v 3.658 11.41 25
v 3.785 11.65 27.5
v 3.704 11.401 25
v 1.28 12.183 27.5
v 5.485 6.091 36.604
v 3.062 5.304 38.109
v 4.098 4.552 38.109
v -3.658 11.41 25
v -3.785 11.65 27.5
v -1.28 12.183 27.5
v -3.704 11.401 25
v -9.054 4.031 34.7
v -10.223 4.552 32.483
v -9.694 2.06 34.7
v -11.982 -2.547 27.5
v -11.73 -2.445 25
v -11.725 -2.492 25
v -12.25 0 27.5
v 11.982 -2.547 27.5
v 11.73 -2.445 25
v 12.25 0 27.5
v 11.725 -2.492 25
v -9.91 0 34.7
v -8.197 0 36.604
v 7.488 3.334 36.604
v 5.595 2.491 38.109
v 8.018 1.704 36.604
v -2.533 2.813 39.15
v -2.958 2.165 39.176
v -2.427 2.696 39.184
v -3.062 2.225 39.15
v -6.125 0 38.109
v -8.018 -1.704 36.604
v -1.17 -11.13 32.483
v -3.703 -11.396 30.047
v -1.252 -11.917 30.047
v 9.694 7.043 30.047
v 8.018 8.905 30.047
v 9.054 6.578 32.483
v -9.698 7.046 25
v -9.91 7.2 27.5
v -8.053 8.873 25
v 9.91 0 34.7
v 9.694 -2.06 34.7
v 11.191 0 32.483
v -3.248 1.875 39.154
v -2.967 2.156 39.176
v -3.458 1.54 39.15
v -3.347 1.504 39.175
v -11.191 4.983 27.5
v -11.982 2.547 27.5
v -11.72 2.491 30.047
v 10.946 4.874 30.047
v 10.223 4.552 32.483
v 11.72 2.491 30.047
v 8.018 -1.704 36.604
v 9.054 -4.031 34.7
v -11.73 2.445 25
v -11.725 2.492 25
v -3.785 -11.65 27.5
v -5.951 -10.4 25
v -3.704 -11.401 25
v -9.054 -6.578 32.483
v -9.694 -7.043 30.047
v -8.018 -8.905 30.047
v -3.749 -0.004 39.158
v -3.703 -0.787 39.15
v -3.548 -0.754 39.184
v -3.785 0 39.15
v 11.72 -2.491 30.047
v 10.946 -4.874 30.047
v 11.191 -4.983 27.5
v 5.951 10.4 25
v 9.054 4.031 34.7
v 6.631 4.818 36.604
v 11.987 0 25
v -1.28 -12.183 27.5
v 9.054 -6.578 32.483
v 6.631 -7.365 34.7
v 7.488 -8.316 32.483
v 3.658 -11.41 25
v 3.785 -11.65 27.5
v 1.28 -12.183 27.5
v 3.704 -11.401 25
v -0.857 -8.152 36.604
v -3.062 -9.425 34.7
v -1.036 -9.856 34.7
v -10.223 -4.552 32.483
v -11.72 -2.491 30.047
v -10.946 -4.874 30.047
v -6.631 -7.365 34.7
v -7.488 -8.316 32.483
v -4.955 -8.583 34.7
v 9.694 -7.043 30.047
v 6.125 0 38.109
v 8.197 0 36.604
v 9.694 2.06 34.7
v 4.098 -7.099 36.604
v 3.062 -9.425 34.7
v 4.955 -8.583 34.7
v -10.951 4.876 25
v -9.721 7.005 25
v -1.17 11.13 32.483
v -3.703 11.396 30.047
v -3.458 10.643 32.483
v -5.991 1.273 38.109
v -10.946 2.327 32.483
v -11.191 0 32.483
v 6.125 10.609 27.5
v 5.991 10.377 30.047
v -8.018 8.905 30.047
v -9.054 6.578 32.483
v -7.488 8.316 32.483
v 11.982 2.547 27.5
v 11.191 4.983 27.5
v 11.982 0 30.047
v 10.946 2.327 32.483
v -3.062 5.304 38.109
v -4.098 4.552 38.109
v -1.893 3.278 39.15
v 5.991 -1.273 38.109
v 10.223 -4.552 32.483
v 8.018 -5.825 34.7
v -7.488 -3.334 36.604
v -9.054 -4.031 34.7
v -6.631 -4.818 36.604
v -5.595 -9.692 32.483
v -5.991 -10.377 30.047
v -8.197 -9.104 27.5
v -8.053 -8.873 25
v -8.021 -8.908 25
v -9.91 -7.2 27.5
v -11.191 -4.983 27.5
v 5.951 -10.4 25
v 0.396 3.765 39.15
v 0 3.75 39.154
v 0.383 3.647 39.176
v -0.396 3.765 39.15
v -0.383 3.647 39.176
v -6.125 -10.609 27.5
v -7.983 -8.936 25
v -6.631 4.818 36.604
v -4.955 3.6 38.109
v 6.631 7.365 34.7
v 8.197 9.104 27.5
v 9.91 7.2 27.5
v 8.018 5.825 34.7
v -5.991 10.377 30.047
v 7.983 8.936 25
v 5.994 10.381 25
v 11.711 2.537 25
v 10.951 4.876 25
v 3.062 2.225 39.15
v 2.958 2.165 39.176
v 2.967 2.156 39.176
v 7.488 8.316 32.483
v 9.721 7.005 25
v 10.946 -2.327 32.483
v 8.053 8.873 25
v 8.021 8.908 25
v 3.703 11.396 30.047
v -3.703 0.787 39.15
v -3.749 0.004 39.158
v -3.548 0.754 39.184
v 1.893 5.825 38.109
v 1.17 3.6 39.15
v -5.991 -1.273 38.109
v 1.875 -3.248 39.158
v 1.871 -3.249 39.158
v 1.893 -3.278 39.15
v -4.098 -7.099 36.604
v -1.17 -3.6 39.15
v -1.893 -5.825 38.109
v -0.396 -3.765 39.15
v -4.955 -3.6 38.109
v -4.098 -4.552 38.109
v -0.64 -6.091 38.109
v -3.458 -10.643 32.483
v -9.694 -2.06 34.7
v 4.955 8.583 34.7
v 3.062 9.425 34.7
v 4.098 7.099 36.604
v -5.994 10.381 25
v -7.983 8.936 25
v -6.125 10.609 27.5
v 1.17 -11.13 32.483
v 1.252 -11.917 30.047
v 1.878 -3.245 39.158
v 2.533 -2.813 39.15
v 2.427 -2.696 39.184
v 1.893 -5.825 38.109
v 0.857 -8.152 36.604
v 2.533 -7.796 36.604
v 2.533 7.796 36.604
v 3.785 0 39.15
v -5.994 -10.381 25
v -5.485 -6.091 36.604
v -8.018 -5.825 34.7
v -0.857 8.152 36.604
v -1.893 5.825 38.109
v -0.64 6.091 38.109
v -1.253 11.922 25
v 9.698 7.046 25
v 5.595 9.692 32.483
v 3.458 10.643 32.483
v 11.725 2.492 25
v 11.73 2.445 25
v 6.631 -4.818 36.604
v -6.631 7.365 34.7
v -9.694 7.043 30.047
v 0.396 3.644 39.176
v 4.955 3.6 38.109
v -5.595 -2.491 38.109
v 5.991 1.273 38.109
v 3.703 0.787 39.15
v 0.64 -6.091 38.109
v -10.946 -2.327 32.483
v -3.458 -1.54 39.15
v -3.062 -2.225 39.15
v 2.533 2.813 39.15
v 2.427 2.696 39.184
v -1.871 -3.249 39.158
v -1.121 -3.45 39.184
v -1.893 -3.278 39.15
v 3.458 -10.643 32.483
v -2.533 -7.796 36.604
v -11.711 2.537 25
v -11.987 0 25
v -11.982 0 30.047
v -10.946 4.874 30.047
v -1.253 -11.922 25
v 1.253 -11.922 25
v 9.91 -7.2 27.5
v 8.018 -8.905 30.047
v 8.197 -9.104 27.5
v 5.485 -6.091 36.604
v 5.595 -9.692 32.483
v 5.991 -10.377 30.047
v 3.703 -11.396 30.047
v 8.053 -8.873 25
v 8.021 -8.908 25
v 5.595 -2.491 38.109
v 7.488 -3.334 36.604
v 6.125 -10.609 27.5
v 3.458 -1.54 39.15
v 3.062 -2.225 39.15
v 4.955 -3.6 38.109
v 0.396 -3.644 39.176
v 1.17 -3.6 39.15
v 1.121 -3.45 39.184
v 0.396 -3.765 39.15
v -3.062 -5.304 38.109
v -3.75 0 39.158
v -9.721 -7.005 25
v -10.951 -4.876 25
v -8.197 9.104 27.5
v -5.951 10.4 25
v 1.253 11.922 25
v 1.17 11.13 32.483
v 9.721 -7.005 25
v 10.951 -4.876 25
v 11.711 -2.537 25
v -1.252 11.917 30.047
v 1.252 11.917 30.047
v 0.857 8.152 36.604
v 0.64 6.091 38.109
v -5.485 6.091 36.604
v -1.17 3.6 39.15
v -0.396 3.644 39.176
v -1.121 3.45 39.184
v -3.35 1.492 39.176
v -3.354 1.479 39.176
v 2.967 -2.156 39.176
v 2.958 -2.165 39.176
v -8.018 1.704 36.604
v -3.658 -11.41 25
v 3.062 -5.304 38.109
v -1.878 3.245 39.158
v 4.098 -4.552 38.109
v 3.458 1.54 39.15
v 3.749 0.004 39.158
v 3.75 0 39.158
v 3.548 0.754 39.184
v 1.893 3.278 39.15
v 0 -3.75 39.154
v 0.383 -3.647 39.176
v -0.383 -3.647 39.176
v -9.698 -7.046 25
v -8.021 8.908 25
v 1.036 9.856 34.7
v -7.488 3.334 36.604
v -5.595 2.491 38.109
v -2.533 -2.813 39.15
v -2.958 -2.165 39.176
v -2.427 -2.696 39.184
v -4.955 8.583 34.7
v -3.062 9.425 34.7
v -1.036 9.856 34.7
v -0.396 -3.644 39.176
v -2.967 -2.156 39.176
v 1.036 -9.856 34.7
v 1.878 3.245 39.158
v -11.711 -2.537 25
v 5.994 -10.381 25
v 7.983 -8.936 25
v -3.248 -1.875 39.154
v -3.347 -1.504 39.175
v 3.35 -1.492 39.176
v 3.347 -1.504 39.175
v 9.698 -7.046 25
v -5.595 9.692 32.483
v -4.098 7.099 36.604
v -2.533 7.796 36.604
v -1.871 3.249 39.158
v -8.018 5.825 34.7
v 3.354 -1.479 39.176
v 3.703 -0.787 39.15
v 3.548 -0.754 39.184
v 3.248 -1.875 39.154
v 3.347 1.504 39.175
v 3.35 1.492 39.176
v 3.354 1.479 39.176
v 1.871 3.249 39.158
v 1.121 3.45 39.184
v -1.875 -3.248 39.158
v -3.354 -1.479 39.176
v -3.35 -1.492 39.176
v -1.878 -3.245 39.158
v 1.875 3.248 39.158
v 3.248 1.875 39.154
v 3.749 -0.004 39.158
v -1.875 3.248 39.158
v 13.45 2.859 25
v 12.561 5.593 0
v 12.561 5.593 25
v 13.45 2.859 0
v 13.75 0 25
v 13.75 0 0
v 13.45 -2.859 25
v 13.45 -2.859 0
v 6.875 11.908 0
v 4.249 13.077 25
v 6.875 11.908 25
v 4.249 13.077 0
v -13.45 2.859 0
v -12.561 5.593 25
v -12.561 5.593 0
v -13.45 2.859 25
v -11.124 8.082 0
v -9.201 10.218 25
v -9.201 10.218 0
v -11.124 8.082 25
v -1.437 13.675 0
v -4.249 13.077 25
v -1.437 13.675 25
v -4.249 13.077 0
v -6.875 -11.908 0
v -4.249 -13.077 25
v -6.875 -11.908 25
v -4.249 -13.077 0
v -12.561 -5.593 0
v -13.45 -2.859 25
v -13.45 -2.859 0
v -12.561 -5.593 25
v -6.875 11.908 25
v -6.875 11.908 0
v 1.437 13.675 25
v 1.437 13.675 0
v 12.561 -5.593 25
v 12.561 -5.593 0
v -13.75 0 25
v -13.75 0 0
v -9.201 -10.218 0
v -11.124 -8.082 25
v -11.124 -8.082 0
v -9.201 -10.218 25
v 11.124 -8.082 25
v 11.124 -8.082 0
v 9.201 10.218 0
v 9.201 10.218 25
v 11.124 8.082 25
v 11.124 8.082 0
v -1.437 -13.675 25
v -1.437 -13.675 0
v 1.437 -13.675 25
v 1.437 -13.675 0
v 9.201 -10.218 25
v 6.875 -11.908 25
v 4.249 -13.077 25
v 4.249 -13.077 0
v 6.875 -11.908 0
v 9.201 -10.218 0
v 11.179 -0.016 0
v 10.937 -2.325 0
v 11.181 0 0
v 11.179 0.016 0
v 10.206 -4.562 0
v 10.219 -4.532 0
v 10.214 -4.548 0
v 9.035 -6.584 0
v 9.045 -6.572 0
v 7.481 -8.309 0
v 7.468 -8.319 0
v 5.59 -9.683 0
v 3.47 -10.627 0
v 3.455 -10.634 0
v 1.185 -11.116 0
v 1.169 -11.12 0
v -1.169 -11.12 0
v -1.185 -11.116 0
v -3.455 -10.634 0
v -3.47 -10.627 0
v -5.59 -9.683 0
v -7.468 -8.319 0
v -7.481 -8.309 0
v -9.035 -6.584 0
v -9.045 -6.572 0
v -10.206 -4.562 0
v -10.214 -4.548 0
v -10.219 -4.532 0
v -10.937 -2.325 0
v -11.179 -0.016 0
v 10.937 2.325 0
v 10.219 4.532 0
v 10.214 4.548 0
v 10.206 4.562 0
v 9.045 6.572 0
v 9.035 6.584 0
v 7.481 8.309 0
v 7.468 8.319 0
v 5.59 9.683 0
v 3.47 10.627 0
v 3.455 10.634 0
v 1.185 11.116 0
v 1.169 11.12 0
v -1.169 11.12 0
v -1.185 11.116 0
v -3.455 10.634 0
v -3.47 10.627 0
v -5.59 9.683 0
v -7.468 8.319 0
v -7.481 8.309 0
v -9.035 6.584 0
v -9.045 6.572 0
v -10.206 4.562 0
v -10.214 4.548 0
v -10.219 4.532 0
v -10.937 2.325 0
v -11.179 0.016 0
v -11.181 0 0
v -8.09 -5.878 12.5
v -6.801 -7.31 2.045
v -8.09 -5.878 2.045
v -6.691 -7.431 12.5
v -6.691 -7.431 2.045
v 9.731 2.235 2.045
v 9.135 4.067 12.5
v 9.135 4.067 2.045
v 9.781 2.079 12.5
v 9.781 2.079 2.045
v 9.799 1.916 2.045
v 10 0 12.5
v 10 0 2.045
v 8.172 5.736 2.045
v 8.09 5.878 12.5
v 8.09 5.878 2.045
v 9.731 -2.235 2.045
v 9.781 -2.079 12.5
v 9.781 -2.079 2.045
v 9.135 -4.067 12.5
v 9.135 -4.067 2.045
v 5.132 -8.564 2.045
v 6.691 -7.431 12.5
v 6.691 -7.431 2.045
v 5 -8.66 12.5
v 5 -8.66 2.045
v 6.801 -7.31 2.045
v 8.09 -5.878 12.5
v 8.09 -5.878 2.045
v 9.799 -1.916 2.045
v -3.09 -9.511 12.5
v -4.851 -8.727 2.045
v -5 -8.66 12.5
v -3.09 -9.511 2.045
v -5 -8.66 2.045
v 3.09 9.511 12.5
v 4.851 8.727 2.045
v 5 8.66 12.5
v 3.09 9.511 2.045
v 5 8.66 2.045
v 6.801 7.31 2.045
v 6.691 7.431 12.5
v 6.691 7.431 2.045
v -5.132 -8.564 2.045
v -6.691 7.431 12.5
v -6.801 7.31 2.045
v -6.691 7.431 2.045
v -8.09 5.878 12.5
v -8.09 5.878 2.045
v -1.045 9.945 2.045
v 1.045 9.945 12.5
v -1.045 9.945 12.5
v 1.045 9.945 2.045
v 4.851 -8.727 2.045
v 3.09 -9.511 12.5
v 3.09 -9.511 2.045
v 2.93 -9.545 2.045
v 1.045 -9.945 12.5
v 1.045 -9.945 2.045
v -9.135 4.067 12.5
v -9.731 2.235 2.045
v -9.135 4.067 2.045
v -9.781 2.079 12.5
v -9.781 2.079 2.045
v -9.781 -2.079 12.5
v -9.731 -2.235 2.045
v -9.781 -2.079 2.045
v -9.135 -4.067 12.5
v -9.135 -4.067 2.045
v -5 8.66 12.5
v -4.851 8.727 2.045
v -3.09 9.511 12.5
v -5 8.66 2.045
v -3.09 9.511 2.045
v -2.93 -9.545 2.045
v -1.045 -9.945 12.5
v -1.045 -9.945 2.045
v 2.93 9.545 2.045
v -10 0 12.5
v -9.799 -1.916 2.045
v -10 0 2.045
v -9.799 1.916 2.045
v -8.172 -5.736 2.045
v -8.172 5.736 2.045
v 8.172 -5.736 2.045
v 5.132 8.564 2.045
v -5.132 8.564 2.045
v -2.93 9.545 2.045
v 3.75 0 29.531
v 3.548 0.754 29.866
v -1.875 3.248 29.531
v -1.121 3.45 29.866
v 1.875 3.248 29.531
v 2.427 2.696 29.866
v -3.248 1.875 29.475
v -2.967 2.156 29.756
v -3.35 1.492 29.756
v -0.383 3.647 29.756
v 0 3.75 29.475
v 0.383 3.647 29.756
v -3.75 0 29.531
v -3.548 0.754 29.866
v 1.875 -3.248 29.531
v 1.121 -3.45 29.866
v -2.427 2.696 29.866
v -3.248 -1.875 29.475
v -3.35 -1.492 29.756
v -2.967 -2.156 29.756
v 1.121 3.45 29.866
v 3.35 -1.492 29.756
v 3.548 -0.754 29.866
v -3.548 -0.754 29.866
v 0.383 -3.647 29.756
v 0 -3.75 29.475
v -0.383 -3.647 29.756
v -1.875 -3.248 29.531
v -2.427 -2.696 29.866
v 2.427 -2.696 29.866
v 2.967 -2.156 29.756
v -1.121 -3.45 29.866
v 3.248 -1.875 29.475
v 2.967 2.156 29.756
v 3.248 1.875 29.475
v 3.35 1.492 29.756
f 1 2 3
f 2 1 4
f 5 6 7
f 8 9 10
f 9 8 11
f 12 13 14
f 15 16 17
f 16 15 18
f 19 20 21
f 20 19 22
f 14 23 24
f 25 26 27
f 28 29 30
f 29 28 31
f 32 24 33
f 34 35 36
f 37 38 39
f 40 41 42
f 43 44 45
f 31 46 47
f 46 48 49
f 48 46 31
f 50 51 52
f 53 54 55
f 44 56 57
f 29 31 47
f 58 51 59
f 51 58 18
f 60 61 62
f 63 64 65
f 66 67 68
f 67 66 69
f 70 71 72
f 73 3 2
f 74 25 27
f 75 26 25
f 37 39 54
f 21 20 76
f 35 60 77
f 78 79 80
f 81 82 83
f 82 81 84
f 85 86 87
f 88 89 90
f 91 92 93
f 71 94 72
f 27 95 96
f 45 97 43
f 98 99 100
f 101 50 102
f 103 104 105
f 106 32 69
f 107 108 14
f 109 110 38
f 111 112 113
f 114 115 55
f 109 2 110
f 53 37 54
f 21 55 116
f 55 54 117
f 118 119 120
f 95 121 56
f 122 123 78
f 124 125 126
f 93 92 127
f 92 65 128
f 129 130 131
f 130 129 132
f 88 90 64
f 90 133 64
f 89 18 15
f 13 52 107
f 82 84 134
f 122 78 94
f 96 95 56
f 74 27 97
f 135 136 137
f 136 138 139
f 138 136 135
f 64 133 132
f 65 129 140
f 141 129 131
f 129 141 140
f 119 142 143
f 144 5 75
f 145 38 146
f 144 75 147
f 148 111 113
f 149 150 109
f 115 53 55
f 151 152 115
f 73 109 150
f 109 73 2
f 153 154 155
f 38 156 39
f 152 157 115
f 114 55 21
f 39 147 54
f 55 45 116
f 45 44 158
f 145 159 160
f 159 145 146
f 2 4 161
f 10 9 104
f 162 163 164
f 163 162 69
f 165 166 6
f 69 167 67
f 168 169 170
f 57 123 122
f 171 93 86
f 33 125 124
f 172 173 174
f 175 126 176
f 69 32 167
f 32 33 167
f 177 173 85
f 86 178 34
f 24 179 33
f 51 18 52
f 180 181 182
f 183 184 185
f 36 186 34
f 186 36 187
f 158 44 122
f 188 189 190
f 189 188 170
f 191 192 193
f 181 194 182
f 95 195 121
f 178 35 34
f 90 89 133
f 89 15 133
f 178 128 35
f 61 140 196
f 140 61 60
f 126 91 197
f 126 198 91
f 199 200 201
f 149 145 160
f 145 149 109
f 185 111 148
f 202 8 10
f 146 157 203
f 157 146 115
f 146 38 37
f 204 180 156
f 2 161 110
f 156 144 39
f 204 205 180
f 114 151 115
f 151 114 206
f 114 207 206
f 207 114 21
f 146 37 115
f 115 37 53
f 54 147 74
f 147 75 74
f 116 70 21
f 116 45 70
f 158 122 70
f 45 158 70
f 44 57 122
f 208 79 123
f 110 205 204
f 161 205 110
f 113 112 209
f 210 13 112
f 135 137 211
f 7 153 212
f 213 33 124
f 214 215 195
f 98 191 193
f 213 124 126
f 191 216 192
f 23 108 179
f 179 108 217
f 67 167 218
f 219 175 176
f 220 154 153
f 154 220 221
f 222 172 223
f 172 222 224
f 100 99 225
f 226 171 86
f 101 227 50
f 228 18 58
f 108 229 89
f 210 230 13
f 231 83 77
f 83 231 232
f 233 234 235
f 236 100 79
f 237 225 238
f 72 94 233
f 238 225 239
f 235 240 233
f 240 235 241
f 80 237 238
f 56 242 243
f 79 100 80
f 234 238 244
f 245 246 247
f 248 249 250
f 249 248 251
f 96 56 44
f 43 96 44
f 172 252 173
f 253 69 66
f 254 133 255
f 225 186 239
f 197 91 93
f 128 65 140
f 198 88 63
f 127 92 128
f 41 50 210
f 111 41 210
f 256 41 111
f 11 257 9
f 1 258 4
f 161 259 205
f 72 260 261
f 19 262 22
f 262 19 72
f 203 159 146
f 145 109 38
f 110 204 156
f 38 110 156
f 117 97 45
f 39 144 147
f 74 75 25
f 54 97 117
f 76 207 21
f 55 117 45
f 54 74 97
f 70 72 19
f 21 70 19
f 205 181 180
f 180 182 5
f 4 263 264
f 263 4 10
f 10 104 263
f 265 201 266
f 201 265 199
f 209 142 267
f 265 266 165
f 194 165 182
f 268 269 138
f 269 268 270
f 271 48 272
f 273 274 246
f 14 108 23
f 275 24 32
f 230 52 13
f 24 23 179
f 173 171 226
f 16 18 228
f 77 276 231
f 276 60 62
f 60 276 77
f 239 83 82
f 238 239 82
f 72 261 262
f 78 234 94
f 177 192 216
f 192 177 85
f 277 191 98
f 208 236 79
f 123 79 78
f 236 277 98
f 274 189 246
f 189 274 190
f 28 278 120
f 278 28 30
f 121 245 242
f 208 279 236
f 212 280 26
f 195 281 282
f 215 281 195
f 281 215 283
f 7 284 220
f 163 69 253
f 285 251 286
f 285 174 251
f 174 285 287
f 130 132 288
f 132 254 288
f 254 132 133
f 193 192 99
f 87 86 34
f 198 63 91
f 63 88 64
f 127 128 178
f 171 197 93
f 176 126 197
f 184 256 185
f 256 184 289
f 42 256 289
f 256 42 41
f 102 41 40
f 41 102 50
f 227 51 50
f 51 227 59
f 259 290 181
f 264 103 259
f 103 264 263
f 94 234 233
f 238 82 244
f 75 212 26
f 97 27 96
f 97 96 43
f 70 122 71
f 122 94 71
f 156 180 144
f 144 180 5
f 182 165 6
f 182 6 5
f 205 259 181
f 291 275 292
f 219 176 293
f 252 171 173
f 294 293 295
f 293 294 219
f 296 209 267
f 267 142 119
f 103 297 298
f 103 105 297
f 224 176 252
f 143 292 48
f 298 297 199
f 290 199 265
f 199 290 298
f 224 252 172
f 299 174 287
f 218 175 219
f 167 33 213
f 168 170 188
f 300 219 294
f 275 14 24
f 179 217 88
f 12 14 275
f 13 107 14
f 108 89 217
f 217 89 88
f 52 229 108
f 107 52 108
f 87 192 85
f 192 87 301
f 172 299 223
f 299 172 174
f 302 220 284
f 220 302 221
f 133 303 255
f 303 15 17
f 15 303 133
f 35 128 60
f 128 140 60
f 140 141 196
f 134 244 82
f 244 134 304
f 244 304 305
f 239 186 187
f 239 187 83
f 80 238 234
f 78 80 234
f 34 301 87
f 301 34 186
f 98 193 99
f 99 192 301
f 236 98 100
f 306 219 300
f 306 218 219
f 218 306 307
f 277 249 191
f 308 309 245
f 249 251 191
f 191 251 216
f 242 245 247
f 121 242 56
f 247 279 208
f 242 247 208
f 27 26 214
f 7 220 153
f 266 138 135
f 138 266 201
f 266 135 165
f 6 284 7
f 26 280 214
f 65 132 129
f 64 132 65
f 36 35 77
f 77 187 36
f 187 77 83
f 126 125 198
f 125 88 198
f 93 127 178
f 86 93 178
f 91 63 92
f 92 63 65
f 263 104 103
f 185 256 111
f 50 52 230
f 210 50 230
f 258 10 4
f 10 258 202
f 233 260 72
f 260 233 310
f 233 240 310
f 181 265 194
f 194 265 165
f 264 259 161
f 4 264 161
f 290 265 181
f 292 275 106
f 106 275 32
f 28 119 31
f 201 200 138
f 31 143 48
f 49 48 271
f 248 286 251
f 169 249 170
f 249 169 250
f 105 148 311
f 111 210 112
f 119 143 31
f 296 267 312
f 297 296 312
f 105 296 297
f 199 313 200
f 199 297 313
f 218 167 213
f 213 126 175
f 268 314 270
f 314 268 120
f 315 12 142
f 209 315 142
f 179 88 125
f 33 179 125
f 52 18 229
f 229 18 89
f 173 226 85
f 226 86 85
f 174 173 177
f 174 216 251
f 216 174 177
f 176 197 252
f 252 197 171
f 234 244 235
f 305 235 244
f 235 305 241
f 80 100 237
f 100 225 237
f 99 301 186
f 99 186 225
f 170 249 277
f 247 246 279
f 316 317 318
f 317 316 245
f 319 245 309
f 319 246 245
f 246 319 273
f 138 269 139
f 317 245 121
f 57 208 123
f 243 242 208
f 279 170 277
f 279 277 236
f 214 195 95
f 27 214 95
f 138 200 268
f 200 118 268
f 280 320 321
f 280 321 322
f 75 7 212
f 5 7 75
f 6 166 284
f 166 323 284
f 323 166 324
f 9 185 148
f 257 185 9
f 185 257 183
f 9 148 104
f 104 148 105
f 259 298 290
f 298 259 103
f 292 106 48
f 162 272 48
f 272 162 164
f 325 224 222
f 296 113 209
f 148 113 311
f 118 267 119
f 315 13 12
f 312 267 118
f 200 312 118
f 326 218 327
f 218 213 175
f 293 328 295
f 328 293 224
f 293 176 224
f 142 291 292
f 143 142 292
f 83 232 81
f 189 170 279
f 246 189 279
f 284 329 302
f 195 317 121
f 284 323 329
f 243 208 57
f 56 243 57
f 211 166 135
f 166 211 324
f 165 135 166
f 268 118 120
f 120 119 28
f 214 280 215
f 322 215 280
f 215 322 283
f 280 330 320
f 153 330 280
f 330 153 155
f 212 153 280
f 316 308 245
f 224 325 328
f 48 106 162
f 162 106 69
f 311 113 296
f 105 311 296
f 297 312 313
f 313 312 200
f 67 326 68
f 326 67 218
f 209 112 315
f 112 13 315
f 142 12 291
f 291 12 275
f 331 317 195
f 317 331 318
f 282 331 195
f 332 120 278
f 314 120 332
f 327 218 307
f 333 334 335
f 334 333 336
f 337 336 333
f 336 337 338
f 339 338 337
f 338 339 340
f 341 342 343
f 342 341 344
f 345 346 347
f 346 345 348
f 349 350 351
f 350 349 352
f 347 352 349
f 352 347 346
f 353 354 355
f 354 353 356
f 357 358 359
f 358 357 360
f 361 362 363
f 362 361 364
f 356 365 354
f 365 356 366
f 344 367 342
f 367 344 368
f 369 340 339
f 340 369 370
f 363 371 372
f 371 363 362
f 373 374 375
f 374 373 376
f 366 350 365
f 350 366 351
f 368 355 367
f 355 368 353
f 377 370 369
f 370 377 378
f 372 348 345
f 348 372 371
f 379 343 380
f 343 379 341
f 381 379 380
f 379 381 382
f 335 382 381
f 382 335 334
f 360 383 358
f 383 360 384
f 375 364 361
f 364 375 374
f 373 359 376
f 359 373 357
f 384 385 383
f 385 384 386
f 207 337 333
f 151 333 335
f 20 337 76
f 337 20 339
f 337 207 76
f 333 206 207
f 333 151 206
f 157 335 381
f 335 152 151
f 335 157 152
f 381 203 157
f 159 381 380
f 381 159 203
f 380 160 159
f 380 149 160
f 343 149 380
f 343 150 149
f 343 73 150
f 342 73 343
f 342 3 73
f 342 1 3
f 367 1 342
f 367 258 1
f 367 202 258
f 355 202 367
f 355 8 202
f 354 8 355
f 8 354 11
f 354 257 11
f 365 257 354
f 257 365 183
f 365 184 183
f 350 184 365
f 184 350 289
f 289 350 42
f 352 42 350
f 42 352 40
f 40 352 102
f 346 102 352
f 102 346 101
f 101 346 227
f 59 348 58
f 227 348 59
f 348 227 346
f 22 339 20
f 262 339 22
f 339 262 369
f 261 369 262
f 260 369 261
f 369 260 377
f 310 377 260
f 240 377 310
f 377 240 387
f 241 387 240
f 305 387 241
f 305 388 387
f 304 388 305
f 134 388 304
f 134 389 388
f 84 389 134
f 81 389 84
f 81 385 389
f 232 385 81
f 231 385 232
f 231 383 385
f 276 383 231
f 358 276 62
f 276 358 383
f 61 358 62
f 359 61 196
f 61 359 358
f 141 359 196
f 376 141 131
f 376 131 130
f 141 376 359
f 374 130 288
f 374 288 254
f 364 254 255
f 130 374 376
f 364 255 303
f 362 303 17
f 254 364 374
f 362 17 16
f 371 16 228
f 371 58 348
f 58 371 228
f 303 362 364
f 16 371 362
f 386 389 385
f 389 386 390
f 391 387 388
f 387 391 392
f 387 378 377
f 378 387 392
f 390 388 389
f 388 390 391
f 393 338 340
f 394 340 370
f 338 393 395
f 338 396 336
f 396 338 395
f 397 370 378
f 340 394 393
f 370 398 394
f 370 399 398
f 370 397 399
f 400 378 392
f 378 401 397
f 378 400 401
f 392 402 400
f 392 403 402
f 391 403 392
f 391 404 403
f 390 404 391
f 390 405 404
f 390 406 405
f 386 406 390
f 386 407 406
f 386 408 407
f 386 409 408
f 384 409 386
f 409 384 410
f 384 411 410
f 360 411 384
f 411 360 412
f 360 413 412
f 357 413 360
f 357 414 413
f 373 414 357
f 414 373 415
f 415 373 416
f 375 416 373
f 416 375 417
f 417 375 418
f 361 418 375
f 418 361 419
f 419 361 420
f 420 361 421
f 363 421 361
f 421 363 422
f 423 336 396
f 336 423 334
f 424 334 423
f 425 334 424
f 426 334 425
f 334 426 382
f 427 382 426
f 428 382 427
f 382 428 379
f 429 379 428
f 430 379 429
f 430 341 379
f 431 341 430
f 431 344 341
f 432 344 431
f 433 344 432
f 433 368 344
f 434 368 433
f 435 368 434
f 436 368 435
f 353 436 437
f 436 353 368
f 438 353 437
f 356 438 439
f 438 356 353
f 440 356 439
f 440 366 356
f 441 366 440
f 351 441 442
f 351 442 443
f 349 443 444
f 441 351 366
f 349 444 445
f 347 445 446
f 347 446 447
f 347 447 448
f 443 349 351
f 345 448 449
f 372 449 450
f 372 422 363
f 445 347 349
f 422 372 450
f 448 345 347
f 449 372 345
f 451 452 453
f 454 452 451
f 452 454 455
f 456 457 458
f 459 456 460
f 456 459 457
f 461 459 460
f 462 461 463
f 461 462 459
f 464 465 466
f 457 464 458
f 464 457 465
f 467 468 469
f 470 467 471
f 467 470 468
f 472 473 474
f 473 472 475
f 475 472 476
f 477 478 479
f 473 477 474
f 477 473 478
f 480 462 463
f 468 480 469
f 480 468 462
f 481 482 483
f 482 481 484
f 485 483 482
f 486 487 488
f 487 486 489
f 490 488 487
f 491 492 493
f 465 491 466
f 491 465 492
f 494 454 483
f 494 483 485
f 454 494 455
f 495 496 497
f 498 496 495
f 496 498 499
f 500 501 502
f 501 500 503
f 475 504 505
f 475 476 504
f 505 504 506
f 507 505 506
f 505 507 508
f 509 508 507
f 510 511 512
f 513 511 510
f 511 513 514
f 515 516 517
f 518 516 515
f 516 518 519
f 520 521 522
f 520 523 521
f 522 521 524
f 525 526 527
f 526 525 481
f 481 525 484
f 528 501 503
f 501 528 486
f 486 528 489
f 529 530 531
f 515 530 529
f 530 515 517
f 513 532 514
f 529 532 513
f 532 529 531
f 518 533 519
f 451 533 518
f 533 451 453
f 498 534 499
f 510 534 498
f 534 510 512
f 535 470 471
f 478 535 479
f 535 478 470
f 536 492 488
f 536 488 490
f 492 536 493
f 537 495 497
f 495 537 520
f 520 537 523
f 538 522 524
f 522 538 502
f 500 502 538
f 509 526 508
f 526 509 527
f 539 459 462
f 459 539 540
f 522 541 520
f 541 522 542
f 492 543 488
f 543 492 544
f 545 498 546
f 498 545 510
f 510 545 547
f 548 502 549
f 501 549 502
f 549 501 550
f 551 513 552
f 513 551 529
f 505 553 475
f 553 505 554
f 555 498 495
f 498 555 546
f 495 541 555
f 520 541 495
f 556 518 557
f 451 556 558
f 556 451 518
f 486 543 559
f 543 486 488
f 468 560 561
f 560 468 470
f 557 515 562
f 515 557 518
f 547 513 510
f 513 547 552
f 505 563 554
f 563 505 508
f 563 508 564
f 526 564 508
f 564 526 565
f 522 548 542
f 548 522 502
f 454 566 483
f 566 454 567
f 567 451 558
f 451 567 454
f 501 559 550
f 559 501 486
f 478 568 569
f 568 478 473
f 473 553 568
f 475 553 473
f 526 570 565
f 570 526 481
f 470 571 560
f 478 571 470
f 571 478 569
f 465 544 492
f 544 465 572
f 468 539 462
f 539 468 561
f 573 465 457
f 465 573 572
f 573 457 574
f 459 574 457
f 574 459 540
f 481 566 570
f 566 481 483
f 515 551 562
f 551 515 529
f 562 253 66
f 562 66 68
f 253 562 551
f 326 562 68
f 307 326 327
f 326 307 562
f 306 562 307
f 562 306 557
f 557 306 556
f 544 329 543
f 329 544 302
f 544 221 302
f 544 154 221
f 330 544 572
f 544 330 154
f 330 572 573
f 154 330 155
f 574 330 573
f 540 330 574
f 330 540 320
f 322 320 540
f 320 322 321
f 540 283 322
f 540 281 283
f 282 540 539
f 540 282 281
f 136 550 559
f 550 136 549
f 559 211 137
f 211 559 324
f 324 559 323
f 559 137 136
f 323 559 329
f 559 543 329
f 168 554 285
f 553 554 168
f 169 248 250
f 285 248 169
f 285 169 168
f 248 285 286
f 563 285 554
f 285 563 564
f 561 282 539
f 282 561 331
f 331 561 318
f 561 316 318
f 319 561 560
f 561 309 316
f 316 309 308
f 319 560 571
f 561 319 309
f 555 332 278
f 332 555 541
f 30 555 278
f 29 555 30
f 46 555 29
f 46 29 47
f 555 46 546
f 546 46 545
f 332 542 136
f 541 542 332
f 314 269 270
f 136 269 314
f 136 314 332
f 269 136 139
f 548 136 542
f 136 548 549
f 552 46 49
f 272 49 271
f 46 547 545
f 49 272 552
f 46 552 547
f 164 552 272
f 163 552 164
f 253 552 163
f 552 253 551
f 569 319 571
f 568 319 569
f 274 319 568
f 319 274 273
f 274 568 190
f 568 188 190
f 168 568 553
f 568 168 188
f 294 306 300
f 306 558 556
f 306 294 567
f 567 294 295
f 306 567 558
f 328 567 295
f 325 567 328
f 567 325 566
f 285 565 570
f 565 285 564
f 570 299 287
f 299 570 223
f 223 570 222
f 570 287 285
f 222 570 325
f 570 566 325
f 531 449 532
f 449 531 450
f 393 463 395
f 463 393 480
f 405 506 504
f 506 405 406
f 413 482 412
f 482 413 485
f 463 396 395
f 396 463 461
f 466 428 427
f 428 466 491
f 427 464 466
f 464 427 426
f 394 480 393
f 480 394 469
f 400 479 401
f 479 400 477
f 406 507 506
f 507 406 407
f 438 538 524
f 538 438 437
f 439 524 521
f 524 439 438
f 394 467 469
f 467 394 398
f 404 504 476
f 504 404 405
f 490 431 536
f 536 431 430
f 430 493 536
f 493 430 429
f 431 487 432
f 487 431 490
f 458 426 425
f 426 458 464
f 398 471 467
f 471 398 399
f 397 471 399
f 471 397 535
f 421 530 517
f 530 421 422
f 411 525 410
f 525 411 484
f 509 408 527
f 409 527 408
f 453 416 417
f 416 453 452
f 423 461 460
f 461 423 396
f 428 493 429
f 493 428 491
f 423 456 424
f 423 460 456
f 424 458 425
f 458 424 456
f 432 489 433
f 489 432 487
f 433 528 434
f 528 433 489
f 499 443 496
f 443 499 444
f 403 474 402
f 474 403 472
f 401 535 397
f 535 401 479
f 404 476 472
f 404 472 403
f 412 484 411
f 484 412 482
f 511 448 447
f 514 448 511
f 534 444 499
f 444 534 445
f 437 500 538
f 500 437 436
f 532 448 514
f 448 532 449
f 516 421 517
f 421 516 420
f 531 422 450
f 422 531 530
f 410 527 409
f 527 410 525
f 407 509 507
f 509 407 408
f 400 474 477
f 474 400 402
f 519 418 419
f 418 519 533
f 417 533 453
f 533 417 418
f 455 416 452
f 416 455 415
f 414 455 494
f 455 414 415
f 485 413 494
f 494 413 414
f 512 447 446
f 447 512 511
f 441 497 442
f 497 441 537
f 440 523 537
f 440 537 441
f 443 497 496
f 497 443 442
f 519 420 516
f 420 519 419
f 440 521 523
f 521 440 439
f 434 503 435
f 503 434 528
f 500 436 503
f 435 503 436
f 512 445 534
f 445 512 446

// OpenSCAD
od=25; //outer diameter
height=25; //height cylindrical part of link

sr=od*.15; //string radius
ballr=(od/2)*0.98; //radius of ball on top

difference() {
	outside();
	inside();
}

//showinside();
module showinside() {
	translate([2*od,0,0])
		inside();
}

module outside () {
	translate([0,0,od*.1+height])
		sphere( r = ballr);
	cylinder(h = height, r1 = 1.1*od/2, r2 = 1.1*od/2);
}

module inside() {
	cylinder(h = (.5*od), r1 = 0.8*od/2, r2 = 0.8*od/2);
	translate([0,0,(.5*od)])
		cylinder(h = ballr+od*.1+height-0.5*od, r1 = 0.8*od/2, r2 = 0);
	cylinder(h=height+od, r1=sr, r2=sr);
	translate([0,0,od*-.2])
		sphere(r=ballr*1);
}
